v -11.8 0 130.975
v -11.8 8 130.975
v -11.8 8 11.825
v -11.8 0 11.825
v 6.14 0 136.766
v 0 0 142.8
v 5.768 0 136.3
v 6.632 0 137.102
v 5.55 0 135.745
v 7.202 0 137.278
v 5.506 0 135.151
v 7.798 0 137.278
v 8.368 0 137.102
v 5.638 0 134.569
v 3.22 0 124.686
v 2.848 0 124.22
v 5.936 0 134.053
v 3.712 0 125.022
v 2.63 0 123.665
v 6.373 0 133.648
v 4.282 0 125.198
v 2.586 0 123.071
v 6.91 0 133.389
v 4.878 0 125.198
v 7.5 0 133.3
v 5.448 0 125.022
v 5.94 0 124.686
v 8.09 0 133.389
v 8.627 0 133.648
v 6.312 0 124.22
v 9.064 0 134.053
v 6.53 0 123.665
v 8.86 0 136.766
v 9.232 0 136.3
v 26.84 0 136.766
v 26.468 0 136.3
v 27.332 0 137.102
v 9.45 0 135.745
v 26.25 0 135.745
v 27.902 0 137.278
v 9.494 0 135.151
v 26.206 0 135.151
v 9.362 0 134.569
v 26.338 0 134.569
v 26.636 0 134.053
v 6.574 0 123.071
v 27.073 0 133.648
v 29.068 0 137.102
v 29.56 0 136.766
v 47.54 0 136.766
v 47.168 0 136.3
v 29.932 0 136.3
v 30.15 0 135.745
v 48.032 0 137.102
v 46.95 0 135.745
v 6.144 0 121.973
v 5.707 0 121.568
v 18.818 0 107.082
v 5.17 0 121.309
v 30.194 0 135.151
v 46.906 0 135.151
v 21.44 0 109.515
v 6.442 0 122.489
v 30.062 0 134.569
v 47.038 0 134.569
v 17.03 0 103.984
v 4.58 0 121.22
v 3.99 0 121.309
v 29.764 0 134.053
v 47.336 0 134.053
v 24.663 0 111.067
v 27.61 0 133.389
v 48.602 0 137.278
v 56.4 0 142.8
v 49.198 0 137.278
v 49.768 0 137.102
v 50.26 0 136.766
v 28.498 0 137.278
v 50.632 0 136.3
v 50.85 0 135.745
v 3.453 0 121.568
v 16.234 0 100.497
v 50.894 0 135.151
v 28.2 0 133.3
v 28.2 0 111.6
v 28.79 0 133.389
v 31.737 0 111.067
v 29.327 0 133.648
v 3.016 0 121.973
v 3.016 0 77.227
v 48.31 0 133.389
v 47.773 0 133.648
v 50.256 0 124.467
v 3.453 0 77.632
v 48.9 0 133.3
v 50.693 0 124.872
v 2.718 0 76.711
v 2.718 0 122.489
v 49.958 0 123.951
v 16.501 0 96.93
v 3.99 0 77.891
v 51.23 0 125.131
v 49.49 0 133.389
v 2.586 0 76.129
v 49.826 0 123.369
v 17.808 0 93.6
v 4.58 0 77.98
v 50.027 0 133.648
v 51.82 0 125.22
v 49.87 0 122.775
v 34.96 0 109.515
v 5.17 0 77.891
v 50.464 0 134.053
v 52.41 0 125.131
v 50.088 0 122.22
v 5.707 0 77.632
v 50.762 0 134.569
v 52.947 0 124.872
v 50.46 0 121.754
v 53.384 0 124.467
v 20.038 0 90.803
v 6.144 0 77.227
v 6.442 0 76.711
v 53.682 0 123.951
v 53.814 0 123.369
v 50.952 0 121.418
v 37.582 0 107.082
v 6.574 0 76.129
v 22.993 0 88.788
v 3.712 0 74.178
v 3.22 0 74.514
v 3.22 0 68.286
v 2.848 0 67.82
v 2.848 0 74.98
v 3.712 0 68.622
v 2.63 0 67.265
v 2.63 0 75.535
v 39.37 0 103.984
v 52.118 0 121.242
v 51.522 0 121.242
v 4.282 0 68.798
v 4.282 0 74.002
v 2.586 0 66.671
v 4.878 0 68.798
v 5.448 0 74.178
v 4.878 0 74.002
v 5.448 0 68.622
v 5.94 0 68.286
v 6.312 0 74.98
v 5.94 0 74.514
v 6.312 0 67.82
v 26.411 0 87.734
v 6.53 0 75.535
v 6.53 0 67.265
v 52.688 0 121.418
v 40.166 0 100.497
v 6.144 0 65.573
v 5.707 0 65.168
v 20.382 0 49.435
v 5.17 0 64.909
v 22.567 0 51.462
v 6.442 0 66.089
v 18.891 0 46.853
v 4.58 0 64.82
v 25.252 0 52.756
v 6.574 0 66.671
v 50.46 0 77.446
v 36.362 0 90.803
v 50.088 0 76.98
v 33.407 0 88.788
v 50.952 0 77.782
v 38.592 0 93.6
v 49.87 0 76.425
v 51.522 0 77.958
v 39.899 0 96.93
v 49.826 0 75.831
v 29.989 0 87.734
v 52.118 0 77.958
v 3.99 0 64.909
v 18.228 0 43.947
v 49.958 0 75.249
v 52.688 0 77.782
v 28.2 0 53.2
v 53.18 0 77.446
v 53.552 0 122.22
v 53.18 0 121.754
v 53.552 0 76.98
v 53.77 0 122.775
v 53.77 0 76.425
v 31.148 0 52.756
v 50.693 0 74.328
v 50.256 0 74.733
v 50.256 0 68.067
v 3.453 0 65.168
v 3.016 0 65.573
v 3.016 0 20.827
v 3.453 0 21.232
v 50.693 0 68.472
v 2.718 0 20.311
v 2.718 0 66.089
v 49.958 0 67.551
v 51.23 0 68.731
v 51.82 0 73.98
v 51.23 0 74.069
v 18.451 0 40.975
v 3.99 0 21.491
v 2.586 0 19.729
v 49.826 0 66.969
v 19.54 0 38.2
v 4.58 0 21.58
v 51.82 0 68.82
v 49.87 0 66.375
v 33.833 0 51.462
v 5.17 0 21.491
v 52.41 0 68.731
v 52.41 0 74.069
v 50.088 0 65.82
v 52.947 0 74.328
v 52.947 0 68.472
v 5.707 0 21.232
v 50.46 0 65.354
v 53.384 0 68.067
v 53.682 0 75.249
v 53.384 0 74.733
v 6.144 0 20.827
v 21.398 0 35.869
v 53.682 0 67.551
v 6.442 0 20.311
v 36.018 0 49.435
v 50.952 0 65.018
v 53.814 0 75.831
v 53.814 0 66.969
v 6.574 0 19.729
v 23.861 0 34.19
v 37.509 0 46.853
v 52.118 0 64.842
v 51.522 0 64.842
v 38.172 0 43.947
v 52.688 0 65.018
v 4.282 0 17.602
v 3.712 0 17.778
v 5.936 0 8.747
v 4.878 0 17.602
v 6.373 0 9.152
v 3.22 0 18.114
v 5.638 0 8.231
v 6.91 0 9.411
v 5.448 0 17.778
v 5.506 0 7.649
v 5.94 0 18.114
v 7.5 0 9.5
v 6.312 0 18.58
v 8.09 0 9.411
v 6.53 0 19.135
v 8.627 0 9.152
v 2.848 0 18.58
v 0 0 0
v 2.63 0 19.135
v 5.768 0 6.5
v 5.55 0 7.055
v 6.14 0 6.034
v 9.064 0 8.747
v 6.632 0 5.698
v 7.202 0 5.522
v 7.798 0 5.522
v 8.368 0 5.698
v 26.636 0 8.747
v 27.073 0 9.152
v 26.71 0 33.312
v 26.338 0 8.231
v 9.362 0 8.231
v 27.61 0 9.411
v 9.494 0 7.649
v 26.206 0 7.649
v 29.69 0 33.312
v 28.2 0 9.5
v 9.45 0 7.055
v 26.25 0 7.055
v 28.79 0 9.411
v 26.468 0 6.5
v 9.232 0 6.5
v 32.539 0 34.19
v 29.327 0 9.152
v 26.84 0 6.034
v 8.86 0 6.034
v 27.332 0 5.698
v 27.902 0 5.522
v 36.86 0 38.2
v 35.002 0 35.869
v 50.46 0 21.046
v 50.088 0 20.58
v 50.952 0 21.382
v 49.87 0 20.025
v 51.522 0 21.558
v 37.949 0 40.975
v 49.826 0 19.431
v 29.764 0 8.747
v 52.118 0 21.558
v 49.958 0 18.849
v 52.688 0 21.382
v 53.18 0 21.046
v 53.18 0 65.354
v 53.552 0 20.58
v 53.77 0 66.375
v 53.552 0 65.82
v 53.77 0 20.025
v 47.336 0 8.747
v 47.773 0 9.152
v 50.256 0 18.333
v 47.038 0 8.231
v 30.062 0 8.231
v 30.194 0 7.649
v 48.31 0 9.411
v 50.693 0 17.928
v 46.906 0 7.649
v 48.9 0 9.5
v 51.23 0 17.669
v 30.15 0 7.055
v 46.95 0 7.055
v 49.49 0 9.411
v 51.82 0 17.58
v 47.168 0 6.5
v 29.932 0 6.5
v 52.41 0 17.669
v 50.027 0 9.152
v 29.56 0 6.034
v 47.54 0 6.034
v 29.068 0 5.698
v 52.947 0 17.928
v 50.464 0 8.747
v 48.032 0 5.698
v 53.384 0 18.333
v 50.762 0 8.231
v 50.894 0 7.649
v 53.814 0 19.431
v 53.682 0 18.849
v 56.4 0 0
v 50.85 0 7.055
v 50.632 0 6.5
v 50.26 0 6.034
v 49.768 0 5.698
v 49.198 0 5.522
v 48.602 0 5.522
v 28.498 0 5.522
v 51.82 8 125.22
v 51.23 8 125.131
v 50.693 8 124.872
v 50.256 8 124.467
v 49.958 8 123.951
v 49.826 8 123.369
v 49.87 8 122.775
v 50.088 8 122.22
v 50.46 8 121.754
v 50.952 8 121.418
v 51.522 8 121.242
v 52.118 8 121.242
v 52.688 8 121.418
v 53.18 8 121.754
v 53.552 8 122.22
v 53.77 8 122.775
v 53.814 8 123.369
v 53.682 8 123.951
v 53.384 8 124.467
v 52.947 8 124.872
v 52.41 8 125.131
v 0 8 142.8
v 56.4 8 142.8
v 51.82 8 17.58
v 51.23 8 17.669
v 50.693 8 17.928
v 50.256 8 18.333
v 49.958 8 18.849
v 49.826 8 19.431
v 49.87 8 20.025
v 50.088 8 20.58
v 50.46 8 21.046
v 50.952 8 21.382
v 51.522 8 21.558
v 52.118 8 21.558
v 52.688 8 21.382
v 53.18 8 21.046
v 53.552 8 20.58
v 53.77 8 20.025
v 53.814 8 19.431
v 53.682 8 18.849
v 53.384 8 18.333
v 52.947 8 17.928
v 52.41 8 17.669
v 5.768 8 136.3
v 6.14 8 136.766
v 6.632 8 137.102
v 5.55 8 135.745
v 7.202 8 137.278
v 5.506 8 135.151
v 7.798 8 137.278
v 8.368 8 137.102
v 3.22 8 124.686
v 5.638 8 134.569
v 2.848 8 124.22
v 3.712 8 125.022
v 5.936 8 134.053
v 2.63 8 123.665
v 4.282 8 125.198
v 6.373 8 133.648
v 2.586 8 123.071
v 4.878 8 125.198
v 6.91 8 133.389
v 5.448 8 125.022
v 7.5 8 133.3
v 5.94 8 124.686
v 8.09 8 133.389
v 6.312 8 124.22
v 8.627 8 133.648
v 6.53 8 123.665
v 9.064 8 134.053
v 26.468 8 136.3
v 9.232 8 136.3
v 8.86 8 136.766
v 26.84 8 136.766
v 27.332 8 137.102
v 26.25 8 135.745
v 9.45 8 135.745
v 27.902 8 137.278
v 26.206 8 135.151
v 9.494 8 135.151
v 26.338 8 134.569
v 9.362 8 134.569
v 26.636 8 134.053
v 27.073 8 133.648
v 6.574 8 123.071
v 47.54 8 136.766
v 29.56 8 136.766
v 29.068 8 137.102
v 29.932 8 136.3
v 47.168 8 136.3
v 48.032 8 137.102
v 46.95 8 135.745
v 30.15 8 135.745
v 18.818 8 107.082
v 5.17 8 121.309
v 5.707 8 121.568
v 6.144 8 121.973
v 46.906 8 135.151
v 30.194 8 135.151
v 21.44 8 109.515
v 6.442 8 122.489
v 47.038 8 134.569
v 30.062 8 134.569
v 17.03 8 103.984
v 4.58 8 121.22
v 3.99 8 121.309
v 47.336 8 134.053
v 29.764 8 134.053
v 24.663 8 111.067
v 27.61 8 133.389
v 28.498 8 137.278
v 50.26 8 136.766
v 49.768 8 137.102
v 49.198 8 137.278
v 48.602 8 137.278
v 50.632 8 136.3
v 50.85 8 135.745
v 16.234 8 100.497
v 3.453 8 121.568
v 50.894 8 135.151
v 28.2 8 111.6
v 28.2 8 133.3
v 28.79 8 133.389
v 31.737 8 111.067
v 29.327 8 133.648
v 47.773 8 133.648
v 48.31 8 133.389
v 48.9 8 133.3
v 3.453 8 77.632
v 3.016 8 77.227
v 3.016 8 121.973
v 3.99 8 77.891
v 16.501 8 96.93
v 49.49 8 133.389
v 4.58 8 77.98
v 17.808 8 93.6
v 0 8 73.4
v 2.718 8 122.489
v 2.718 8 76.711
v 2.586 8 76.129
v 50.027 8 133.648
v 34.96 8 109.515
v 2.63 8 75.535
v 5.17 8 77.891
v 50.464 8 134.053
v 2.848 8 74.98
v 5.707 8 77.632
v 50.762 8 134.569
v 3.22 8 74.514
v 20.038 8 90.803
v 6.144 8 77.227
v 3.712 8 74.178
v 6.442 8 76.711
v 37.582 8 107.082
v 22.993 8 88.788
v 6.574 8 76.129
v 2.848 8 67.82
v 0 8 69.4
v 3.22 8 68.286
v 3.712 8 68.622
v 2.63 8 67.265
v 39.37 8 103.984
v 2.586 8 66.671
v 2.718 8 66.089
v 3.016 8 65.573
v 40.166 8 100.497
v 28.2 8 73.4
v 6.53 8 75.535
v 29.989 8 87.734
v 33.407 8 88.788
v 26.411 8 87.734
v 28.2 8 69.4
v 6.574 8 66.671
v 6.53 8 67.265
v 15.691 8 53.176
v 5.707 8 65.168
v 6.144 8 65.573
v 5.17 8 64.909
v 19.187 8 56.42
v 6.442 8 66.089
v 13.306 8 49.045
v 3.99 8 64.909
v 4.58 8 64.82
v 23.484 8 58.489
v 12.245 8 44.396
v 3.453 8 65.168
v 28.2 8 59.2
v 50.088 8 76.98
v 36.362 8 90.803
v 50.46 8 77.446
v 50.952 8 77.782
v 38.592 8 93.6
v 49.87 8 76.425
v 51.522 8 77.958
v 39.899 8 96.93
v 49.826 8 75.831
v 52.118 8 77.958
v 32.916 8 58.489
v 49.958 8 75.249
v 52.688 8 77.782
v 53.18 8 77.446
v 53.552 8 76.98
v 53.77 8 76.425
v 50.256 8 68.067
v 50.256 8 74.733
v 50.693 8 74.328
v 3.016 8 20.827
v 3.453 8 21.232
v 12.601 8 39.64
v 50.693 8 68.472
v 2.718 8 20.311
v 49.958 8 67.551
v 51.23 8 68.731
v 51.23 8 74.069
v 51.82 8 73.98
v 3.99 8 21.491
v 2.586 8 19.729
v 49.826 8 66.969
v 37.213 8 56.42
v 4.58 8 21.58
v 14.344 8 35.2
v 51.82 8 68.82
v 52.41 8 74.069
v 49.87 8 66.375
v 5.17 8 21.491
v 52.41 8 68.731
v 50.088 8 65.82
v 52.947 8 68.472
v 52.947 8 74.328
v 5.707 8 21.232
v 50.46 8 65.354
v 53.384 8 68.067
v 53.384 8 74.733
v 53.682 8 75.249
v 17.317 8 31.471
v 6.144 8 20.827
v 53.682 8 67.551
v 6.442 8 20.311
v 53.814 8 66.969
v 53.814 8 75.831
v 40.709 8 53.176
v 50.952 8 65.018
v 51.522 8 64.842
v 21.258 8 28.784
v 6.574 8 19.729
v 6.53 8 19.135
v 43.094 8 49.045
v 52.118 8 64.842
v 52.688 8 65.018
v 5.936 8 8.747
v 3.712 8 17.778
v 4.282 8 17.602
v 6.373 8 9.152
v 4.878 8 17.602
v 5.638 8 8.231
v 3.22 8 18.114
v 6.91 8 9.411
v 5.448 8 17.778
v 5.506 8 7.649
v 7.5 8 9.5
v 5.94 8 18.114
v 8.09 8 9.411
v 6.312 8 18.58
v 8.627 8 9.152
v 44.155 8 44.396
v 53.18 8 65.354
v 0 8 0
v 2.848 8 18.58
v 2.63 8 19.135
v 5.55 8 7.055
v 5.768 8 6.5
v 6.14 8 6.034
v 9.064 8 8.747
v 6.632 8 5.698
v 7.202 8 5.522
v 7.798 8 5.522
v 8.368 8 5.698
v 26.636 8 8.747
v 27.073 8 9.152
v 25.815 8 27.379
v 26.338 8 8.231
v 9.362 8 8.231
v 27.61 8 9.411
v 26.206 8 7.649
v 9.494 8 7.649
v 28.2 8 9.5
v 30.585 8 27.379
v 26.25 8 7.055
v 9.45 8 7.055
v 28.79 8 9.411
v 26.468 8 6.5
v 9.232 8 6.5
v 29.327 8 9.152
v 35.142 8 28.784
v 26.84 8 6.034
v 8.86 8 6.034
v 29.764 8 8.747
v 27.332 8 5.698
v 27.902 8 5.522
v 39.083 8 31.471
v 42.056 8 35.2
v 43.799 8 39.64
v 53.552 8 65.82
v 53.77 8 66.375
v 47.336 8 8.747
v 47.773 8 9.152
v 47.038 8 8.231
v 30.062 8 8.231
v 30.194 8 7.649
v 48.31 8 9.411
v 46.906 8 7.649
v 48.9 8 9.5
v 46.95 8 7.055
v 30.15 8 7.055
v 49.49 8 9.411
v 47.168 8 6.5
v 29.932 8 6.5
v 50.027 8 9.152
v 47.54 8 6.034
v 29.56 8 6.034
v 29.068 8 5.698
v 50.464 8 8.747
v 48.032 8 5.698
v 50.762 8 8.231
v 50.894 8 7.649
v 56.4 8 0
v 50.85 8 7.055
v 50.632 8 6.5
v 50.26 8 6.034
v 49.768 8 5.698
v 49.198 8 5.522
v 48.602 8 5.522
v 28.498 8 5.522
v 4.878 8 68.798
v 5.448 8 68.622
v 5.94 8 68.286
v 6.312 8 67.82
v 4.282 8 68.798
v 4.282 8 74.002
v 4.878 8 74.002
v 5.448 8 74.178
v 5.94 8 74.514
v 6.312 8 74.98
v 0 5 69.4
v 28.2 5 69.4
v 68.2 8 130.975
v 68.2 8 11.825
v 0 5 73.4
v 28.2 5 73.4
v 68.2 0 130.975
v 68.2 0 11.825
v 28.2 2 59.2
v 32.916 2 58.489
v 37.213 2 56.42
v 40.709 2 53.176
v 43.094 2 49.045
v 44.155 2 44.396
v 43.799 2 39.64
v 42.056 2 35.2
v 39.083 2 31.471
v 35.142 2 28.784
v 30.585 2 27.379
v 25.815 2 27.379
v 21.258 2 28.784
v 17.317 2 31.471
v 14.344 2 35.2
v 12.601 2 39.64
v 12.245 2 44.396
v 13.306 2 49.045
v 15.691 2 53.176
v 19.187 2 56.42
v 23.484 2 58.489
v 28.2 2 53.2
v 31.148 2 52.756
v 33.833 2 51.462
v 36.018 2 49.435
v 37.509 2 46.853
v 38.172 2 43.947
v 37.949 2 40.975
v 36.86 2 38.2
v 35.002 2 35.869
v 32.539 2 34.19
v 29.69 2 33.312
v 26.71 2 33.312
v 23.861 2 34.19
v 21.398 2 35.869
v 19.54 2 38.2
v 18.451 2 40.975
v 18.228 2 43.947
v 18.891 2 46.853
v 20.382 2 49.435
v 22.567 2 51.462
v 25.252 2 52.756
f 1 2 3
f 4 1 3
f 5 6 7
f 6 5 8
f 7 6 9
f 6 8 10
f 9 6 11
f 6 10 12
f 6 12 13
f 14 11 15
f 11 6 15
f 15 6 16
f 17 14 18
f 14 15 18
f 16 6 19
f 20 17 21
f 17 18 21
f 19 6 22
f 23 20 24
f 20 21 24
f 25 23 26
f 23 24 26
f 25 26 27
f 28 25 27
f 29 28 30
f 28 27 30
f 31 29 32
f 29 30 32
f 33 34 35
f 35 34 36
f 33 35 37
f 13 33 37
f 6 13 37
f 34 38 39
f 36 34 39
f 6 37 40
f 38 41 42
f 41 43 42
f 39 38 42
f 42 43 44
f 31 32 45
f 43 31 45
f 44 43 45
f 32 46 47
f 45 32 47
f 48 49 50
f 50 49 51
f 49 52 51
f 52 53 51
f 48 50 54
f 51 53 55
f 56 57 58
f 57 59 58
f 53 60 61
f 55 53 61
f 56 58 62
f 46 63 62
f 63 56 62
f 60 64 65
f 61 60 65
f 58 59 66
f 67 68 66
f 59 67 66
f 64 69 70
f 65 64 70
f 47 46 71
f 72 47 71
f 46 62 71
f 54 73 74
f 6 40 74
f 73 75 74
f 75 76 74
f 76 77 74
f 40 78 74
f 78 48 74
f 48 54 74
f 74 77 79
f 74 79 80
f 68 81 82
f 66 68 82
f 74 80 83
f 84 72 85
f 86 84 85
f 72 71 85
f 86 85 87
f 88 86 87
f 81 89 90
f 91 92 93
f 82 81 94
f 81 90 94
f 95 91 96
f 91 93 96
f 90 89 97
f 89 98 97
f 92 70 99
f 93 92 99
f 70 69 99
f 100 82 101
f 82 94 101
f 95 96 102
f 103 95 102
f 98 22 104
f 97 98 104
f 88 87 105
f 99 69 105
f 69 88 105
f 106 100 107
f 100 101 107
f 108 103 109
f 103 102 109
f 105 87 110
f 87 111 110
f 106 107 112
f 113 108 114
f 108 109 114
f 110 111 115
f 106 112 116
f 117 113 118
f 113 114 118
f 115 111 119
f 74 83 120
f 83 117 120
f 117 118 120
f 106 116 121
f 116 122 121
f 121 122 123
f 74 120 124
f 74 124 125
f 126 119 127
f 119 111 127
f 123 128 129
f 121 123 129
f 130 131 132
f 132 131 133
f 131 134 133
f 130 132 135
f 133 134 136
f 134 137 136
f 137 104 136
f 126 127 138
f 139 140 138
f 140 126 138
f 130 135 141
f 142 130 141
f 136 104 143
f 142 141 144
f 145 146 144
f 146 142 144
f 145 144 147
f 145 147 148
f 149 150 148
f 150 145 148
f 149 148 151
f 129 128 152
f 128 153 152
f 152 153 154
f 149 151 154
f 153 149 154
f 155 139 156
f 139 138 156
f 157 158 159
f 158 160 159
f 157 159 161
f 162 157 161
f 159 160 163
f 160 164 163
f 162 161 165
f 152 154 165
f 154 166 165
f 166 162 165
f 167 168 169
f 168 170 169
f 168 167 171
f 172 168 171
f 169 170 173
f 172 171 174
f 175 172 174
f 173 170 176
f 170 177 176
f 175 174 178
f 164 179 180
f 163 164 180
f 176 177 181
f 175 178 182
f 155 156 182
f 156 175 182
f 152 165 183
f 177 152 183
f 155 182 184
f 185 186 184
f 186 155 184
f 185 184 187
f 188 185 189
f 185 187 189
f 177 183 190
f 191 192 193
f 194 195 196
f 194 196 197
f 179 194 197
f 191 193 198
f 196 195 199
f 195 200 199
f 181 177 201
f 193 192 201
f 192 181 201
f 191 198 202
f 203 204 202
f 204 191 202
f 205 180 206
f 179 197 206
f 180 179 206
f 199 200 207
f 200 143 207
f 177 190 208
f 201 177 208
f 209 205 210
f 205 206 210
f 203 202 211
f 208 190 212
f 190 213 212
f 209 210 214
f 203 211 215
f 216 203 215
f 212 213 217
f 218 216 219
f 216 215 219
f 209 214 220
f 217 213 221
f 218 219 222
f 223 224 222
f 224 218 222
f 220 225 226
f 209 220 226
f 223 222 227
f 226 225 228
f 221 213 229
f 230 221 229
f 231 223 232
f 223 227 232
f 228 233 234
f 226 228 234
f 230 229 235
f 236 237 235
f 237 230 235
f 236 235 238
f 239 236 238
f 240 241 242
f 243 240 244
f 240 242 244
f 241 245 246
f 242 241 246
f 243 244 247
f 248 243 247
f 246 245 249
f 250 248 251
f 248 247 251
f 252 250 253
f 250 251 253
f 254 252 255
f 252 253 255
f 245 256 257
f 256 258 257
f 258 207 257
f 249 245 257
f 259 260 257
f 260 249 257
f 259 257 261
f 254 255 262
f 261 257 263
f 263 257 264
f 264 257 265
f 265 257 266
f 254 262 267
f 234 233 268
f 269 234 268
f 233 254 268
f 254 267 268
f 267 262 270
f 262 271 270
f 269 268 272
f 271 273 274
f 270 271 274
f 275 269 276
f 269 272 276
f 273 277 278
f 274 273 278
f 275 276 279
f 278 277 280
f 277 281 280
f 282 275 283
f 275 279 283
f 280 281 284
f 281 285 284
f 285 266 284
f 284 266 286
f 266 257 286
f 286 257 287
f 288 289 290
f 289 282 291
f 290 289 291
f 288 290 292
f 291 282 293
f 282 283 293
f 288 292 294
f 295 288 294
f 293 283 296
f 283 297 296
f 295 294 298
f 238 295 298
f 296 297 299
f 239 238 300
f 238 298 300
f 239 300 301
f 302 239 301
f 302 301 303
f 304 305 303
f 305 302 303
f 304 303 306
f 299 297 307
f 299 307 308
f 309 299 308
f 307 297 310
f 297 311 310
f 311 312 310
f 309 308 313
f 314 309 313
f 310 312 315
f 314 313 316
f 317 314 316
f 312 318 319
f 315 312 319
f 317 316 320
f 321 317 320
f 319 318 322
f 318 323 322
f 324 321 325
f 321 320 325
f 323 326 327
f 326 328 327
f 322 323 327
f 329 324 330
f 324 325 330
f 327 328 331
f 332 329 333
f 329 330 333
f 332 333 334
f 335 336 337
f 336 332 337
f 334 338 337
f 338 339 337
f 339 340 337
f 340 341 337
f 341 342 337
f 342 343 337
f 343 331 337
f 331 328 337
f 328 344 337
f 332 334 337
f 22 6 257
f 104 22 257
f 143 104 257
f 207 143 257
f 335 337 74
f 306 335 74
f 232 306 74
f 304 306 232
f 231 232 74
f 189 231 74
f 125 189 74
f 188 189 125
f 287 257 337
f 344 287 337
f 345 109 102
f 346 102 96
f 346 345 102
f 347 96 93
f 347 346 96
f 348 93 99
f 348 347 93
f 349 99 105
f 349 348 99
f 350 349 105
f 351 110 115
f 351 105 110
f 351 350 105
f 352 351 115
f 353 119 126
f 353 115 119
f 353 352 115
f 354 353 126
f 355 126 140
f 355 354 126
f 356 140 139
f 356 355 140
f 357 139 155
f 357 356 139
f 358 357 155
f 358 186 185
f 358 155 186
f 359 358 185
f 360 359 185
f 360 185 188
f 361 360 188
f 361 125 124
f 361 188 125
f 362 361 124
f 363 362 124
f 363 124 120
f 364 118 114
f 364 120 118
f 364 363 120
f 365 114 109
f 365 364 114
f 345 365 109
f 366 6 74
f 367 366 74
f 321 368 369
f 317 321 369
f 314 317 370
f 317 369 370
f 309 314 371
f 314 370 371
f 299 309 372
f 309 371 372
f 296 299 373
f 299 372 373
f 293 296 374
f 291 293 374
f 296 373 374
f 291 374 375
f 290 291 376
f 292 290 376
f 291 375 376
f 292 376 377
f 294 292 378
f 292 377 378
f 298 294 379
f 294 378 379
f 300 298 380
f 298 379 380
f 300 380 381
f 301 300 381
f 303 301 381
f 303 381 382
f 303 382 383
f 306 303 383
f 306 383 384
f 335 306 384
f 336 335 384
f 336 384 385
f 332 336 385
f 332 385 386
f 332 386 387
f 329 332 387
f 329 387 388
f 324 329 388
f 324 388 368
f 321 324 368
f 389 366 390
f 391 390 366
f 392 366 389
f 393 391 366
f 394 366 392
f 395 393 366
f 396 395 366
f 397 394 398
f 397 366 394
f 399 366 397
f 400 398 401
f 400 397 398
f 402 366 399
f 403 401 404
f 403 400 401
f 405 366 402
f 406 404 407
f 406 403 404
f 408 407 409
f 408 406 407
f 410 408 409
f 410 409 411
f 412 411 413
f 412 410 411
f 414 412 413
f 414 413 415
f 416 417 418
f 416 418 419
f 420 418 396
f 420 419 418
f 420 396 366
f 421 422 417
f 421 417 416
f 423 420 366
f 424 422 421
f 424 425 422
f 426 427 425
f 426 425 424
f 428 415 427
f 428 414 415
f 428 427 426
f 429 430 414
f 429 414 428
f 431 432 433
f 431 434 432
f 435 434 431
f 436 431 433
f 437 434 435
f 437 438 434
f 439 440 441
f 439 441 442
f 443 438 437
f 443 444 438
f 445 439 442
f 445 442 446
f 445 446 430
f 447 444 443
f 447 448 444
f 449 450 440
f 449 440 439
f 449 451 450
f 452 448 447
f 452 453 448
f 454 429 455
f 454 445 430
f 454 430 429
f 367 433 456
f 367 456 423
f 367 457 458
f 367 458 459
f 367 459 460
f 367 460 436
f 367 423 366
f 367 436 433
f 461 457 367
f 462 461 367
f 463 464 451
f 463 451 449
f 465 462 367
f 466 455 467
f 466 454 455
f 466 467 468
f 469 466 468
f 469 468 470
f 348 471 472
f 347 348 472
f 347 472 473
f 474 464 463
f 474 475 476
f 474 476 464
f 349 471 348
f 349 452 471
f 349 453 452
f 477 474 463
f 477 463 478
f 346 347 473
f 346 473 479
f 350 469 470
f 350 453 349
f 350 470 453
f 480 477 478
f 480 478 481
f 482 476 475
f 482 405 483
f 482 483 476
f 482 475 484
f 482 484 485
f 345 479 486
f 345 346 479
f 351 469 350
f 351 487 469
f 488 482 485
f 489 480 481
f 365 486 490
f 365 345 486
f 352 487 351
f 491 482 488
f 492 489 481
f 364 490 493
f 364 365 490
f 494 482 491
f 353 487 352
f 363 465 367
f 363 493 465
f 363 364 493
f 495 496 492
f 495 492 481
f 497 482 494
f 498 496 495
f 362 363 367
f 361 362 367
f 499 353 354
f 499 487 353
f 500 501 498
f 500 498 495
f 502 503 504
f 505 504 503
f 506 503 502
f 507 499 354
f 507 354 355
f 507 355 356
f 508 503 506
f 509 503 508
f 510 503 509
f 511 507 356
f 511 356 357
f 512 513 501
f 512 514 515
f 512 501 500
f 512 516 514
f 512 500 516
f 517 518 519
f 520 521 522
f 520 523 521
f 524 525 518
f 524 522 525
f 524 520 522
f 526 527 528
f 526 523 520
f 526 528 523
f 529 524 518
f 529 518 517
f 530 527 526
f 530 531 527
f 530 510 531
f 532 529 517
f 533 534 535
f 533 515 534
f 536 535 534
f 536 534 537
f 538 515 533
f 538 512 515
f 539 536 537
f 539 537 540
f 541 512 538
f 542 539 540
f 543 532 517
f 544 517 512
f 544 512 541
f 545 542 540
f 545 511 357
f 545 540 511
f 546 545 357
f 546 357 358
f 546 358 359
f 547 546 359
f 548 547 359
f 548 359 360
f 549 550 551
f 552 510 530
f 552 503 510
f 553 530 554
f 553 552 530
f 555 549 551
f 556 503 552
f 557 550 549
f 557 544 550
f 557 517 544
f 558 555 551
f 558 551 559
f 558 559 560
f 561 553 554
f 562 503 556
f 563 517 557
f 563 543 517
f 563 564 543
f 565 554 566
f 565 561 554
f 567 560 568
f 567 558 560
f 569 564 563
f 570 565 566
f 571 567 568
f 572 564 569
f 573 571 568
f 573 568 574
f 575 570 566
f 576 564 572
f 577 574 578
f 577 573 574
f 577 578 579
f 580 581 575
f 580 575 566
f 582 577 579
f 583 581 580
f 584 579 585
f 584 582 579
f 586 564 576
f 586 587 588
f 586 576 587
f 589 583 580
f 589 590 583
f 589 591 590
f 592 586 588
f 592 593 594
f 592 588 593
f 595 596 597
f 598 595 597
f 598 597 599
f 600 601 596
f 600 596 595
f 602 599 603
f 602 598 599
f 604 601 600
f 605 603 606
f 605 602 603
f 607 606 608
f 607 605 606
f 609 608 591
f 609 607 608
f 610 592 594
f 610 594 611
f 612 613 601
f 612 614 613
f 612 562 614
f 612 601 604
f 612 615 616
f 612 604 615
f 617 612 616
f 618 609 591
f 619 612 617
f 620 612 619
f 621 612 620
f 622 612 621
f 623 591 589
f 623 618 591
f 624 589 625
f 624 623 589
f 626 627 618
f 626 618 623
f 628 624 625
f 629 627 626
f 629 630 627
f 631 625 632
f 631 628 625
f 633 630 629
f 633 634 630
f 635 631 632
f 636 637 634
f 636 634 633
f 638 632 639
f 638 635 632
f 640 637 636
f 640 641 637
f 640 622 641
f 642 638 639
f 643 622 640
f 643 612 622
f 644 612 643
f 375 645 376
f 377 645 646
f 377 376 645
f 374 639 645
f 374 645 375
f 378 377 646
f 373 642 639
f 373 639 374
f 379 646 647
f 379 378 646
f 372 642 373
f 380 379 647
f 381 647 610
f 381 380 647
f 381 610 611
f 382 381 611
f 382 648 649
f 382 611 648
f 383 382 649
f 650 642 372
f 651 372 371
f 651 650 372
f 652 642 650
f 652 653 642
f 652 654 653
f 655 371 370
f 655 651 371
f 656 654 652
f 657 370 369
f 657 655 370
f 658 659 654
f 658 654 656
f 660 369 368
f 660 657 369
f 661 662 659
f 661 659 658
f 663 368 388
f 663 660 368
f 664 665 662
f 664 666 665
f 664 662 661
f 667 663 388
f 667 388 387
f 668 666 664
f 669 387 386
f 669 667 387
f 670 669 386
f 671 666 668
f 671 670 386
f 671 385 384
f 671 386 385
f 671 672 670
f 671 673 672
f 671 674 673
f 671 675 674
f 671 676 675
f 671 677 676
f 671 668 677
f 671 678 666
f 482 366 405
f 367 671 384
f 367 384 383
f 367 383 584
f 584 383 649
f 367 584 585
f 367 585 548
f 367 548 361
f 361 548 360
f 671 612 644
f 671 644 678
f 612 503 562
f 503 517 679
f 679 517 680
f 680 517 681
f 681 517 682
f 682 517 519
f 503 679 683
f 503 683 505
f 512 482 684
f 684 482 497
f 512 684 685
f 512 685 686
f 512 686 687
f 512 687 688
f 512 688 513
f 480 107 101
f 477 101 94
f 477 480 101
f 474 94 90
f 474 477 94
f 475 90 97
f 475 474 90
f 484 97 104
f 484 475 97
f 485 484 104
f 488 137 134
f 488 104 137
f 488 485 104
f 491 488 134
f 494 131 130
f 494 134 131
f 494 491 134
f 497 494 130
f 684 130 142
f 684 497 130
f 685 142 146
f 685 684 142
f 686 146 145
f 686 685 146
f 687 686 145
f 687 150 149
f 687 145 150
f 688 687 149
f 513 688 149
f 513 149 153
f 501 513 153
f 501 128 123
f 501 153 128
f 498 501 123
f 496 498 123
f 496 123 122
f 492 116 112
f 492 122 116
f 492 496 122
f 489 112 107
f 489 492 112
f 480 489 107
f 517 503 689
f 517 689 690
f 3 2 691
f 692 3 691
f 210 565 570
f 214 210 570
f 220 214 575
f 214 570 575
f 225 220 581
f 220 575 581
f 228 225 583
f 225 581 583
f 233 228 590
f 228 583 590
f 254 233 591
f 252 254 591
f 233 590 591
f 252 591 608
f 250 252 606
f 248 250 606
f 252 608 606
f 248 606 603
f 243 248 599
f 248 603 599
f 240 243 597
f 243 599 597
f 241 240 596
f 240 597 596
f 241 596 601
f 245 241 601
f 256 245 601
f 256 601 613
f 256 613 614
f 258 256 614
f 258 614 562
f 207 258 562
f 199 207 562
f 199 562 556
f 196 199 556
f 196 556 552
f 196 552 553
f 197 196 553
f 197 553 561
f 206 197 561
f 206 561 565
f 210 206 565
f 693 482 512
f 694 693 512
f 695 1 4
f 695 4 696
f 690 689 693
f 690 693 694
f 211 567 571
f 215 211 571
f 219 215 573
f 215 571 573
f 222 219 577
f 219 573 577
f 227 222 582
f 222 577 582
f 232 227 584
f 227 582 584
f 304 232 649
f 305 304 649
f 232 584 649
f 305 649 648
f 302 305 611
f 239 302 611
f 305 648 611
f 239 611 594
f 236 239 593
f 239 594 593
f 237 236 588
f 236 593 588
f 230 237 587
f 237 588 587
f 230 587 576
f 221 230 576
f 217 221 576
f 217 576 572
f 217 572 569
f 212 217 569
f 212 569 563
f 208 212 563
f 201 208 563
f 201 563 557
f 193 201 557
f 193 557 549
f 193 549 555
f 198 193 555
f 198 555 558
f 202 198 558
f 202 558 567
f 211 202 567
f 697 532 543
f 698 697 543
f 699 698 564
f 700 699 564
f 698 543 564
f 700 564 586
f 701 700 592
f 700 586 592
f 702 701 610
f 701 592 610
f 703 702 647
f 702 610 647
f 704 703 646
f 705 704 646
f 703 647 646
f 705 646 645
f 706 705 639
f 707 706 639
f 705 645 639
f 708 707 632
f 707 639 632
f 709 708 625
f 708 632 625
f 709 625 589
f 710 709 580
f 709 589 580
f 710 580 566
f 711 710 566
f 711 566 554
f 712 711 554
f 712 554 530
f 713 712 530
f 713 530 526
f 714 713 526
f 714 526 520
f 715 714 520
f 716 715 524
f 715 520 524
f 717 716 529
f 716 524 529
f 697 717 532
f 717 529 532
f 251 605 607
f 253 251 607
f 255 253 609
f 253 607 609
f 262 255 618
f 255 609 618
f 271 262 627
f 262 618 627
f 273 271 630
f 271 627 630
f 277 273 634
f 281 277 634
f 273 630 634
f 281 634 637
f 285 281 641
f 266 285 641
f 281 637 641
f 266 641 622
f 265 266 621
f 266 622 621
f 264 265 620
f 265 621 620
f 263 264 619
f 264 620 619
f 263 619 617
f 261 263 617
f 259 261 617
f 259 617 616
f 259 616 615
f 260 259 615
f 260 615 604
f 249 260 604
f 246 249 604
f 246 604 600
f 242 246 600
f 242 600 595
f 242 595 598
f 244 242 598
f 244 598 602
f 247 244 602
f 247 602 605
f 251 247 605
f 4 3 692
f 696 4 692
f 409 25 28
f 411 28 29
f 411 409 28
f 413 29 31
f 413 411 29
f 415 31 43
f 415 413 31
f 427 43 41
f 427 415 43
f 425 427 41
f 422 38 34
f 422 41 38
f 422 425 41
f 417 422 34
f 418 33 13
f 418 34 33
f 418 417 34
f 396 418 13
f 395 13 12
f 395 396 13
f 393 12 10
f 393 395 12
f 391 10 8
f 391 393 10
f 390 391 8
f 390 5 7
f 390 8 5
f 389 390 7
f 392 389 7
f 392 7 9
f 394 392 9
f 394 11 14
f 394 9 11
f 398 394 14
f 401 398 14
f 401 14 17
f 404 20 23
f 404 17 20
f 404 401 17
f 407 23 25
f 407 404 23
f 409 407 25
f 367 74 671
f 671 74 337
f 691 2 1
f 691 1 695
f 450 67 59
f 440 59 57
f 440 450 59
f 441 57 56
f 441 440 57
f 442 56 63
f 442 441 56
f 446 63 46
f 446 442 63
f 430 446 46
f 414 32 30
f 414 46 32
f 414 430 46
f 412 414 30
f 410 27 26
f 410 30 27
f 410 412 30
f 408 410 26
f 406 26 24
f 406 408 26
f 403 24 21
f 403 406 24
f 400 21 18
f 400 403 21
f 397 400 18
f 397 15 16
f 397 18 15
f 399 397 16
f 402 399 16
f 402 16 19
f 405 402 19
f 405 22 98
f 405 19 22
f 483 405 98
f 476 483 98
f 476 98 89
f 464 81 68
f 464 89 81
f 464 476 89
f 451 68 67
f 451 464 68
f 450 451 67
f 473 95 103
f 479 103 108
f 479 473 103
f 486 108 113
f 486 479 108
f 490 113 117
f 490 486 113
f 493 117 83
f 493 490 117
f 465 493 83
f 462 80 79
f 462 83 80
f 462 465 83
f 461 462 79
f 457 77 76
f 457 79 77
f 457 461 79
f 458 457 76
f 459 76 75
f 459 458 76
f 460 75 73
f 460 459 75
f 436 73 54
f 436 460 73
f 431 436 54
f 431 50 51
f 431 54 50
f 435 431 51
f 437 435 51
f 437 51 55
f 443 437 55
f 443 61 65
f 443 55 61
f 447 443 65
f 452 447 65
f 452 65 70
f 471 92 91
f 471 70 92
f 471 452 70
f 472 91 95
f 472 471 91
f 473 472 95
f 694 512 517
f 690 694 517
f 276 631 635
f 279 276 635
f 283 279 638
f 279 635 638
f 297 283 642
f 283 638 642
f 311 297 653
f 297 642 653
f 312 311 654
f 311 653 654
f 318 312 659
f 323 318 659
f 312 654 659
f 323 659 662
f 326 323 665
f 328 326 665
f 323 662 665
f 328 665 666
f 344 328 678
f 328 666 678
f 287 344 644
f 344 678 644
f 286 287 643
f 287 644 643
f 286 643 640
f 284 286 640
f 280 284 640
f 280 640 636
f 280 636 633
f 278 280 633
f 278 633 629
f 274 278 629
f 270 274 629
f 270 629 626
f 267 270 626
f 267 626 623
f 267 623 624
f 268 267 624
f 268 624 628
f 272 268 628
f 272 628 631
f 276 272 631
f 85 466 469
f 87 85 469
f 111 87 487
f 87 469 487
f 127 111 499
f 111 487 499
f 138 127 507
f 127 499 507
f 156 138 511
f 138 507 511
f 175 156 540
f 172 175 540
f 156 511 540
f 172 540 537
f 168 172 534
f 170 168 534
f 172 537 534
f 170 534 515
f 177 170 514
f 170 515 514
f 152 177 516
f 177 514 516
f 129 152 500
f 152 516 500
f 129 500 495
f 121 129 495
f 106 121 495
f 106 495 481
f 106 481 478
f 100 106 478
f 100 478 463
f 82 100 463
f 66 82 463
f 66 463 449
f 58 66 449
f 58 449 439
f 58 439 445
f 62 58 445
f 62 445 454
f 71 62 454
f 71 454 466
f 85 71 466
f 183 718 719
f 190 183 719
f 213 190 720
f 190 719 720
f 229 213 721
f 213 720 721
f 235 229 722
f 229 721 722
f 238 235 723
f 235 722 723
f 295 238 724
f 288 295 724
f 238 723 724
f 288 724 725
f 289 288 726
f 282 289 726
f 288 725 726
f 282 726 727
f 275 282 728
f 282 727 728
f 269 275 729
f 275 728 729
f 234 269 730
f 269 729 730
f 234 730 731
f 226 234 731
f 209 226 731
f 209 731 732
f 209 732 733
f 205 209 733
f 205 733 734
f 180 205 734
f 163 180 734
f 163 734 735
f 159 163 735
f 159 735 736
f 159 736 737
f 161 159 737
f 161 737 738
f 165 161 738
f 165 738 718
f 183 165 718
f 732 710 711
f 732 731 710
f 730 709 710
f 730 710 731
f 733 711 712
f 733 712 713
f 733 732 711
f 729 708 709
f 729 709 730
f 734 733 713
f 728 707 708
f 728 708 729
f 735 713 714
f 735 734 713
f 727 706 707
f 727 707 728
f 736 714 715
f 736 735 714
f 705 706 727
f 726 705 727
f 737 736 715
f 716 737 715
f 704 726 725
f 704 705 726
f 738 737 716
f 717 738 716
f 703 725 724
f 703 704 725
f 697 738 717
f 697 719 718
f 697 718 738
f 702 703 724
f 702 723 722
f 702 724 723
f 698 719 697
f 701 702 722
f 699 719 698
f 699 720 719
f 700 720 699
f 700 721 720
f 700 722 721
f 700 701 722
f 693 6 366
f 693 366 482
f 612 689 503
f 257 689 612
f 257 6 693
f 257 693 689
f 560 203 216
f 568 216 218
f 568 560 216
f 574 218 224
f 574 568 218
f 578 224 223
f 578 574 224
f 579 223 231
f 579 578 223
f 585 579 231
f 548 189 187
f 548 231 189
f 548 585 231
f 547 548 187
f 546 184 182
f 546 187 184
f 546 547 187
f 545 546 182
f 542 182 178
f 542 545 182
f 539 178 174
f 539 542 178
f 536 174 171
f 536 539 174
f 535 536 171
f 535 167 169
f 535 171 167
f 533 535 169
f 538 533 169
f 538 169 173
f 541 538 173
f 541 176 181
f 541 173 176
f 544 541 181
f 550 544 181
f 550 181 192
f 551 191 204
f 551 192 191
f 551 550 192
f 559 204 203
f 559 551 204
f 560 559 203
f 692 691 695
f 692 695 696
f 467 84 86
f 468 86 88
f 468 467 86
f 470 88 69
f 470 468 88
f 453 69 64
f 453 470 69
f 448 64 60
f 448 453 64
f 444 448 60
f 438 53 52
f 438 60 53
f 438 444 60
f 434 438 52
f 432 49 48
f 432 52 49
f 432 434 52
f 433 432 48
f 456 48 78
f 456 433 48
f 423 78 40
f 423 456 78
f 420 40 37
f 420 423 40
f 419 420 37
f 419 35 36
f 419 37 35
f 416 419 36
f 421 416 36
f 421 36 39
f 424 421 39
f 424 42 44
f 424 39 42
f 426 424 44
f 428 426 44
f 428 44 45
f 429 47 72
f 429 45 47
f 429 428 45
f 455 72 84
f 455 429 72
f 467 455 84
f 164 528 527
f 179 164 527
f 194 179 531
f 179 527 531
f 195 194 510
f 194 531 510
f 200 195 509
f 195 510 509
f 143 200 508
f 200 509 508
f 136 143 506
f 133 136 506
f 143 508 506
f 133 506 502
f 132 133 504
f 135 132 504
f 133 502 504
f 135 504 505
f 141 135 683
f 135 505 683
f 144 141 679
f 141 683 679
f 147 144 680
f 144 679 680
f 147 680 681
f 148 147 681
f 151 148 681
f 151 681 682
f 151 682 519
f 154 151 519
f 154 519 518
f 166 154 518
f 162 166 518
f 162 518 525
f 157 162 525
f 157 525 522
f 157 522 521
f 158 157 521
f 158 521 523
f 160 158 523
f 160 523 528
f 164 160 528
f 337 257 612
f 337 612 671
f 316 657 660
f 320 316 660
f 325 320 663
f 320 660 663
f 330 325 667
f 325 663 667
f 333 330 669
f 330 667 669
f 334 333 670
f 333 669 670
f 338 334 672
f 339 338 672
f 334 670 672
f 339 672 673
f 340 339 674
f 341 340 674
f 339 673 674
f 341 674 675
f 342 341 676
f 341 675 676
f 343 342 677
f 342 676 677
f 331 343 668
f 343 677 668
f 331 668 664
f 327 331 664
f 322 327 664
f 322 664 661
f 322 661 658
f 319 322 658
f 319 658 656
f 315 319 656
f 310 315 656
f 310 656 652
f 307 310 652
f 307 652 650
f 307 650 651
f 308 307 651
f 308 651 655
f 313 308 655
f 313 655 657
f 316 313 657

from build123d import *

# Parameters (mm, degrees)
SKETCH1_W           = 56.4
SKETCH1_H           = 142.8
BOSS_EXTRUDE1_DEPTH = 8
SKETCH2_R           = 16
CUT_EXTRUDE1_DEPTH  = 6
SKETCH3_R           = 10
CUT_EXTRUDE2_DEPTH  = 154.651553848
SKETCH4_R           = 2
CUT_EXTRUDE3_DEPTH  = 154.7426421
SKETCH5_R           = 12
CUT_EXTRUDE4_DEPTH  = 154.7426421
SKETCH6_W           = 80
SKETCH6_H           = 119.15
BOSS_EXTRUDE2_DEPTH = 8
SKETCH9_R           = 2
CUT_EXTRUDE5_DEPTH  = 10
SKETCH10_W          = 29
SKETCH10_H          = 4
CUT_EXTRUDE6_DEPTH  = 3


with BuildPart() as part:
    # Sketch1 → Boss-Extrude1 (new body)
    with BuildSketch(Plane(origin=(0, 0, 0), x_dir=(1, 0, 0), z_dir=(0, 1, 0))):
        with Locations((28.2, -71.4)):
            Rectangle(SKETCH1_W, SKETCH1_H)
    extrude(amount=BOSS_EXTRUDE1_DEPTH)

    # Sketch2 → Cut-Extrude1 (cut)
    with BuildSketch(Plane(origin=(0, 8, 0), x_dir=(1, 0, 0), z_dir=(0, 1, 0))):
        with Locations(Location((28.2, -43.2, 0), (0, 0, 270))):
            Circle(SKETCH2_R)
    extrude(amount=-CUT_EXTRUDE1_DEPTH, mode=Mode.SUBTRACT)

    # Sketch3 → Cut-Extrude2 (cut, through all)
    with BuildSketch(Plane(origin=(0, 2, 0), x_dir=(1, 0, 0), z_dir=(0, 1, 0))):
        with Locations(Location((28.2, -43.2, 0), (0, 0, 270))):
            Circle(SKETCH3_R)
    extrude(amount=-CUT_EXTRUDE2_DEPTH, mode=Mode.SUBTRACT)

    # Sketch4 → Cut-Extrude3 (cut, through all)
    with BuildSketch(Plane(origin=(0, 8, 0), x_dir=(1, 0, 0), z_dir=(0, 1, 0))):
        with Locations(Location((4.58, -19.58, 0), (0, 0, 270))):
            Circle(SKETCH4_R)
        with Locations(Location((51.82, -19.58, 0), (0, 0, 90))):
            Circle(SKETCH4_R)
        with Locations(Location((51.82, -66.82, 0), (0, 0, 270))):
            Circle(SKETCH4_R)
        with Locations(Location((4.58, -66.82, 0), (0, 0, 90))):
            Circle(SKETCH4_R)
    cut_extrude3 = extrude(amount=-CUT_EXTRUDE3_DEPTH, mode=Mode.SUBTRACT)

    # Sketch5 → Cut-Extrude4 (cut, through all)
    with BuildSketch(Plane(origin=(0, 8, 0), x_dir=(1, 0, 0), z_dir=(0, 1, 0))):
        with Locations(Location((28.2, -99.6, 0), (0, 0, 270))):
            Circle(SKETCH5_R)
    extrude(amount=-CUT_EXTRUDE4_DEPTH, mode=Mode.SUBTRACT)

    # Mirror1: Cut-Extrude3 across plane
    add(cut_extrude3.mirror(Plane.XY.offset(71.4)), mode=Mode.SUBTRACT)

    # Sketch9 → Cut-Extrude5 (cut)
    with BuildSketch(Plane(origin=(0, 8, 0), x_dir=(1, 0, 0), z_dir=(0, 1, 0))):
        with Locations(Location((7.5, -7.5, 0), (0, 0, 270))):
            Circle(SKETCH9_R)
        with Locations(Location((28.2, -7.5, 0), (0, 0, 270))):
            Circle(SKETCH9_R)
        with Locations(Location((48.9, -7.5, 0), (0, 0, 270))):
            Circle(SKETCH9_R)
    cut_extrude5 = extrude(amount=-CUT_EXTRUDE5_DEPTH, mode=Mode.SUBTRACT)

    # Mirror2: Cut-Extrude5 across plane
    add(cut_extrude5.mirror(Plane.XY.offset(71.4)), mode=Mode.SUBTRACT)

    # Sketch10 → Cut-Extrude6 (cut)
    with BuildSketch(Plane(origin=(0, 8, 0), x_dir=(1, 0, 0), z_dir=(0, 1, 0))):
        with Locations((13.7, -71.4)):
            Rectangle(SKETCH10_W, SKETCH10_H)
    extrude(amount=-CUT_EXTRUDE6_DEPTH, mode=Mode.SUBTRACT)


with BuildPart() as body_2:
    # Sketch6 → Boss-Extrude2 (new body)
    with BuildSketch(Plane(origin=(0, 8, 0), x_dir=(1, 0, 0), z_dir=(0, 1, 0))):
        with Locations((28.2, -71.4)):
            Rectangle(SKETCH6_W, SKETCH6_H)
    extrude(amount=-BOSS_EXTRUDE2_DEPTH)


solid = Compound([part.part, body_2.part])
